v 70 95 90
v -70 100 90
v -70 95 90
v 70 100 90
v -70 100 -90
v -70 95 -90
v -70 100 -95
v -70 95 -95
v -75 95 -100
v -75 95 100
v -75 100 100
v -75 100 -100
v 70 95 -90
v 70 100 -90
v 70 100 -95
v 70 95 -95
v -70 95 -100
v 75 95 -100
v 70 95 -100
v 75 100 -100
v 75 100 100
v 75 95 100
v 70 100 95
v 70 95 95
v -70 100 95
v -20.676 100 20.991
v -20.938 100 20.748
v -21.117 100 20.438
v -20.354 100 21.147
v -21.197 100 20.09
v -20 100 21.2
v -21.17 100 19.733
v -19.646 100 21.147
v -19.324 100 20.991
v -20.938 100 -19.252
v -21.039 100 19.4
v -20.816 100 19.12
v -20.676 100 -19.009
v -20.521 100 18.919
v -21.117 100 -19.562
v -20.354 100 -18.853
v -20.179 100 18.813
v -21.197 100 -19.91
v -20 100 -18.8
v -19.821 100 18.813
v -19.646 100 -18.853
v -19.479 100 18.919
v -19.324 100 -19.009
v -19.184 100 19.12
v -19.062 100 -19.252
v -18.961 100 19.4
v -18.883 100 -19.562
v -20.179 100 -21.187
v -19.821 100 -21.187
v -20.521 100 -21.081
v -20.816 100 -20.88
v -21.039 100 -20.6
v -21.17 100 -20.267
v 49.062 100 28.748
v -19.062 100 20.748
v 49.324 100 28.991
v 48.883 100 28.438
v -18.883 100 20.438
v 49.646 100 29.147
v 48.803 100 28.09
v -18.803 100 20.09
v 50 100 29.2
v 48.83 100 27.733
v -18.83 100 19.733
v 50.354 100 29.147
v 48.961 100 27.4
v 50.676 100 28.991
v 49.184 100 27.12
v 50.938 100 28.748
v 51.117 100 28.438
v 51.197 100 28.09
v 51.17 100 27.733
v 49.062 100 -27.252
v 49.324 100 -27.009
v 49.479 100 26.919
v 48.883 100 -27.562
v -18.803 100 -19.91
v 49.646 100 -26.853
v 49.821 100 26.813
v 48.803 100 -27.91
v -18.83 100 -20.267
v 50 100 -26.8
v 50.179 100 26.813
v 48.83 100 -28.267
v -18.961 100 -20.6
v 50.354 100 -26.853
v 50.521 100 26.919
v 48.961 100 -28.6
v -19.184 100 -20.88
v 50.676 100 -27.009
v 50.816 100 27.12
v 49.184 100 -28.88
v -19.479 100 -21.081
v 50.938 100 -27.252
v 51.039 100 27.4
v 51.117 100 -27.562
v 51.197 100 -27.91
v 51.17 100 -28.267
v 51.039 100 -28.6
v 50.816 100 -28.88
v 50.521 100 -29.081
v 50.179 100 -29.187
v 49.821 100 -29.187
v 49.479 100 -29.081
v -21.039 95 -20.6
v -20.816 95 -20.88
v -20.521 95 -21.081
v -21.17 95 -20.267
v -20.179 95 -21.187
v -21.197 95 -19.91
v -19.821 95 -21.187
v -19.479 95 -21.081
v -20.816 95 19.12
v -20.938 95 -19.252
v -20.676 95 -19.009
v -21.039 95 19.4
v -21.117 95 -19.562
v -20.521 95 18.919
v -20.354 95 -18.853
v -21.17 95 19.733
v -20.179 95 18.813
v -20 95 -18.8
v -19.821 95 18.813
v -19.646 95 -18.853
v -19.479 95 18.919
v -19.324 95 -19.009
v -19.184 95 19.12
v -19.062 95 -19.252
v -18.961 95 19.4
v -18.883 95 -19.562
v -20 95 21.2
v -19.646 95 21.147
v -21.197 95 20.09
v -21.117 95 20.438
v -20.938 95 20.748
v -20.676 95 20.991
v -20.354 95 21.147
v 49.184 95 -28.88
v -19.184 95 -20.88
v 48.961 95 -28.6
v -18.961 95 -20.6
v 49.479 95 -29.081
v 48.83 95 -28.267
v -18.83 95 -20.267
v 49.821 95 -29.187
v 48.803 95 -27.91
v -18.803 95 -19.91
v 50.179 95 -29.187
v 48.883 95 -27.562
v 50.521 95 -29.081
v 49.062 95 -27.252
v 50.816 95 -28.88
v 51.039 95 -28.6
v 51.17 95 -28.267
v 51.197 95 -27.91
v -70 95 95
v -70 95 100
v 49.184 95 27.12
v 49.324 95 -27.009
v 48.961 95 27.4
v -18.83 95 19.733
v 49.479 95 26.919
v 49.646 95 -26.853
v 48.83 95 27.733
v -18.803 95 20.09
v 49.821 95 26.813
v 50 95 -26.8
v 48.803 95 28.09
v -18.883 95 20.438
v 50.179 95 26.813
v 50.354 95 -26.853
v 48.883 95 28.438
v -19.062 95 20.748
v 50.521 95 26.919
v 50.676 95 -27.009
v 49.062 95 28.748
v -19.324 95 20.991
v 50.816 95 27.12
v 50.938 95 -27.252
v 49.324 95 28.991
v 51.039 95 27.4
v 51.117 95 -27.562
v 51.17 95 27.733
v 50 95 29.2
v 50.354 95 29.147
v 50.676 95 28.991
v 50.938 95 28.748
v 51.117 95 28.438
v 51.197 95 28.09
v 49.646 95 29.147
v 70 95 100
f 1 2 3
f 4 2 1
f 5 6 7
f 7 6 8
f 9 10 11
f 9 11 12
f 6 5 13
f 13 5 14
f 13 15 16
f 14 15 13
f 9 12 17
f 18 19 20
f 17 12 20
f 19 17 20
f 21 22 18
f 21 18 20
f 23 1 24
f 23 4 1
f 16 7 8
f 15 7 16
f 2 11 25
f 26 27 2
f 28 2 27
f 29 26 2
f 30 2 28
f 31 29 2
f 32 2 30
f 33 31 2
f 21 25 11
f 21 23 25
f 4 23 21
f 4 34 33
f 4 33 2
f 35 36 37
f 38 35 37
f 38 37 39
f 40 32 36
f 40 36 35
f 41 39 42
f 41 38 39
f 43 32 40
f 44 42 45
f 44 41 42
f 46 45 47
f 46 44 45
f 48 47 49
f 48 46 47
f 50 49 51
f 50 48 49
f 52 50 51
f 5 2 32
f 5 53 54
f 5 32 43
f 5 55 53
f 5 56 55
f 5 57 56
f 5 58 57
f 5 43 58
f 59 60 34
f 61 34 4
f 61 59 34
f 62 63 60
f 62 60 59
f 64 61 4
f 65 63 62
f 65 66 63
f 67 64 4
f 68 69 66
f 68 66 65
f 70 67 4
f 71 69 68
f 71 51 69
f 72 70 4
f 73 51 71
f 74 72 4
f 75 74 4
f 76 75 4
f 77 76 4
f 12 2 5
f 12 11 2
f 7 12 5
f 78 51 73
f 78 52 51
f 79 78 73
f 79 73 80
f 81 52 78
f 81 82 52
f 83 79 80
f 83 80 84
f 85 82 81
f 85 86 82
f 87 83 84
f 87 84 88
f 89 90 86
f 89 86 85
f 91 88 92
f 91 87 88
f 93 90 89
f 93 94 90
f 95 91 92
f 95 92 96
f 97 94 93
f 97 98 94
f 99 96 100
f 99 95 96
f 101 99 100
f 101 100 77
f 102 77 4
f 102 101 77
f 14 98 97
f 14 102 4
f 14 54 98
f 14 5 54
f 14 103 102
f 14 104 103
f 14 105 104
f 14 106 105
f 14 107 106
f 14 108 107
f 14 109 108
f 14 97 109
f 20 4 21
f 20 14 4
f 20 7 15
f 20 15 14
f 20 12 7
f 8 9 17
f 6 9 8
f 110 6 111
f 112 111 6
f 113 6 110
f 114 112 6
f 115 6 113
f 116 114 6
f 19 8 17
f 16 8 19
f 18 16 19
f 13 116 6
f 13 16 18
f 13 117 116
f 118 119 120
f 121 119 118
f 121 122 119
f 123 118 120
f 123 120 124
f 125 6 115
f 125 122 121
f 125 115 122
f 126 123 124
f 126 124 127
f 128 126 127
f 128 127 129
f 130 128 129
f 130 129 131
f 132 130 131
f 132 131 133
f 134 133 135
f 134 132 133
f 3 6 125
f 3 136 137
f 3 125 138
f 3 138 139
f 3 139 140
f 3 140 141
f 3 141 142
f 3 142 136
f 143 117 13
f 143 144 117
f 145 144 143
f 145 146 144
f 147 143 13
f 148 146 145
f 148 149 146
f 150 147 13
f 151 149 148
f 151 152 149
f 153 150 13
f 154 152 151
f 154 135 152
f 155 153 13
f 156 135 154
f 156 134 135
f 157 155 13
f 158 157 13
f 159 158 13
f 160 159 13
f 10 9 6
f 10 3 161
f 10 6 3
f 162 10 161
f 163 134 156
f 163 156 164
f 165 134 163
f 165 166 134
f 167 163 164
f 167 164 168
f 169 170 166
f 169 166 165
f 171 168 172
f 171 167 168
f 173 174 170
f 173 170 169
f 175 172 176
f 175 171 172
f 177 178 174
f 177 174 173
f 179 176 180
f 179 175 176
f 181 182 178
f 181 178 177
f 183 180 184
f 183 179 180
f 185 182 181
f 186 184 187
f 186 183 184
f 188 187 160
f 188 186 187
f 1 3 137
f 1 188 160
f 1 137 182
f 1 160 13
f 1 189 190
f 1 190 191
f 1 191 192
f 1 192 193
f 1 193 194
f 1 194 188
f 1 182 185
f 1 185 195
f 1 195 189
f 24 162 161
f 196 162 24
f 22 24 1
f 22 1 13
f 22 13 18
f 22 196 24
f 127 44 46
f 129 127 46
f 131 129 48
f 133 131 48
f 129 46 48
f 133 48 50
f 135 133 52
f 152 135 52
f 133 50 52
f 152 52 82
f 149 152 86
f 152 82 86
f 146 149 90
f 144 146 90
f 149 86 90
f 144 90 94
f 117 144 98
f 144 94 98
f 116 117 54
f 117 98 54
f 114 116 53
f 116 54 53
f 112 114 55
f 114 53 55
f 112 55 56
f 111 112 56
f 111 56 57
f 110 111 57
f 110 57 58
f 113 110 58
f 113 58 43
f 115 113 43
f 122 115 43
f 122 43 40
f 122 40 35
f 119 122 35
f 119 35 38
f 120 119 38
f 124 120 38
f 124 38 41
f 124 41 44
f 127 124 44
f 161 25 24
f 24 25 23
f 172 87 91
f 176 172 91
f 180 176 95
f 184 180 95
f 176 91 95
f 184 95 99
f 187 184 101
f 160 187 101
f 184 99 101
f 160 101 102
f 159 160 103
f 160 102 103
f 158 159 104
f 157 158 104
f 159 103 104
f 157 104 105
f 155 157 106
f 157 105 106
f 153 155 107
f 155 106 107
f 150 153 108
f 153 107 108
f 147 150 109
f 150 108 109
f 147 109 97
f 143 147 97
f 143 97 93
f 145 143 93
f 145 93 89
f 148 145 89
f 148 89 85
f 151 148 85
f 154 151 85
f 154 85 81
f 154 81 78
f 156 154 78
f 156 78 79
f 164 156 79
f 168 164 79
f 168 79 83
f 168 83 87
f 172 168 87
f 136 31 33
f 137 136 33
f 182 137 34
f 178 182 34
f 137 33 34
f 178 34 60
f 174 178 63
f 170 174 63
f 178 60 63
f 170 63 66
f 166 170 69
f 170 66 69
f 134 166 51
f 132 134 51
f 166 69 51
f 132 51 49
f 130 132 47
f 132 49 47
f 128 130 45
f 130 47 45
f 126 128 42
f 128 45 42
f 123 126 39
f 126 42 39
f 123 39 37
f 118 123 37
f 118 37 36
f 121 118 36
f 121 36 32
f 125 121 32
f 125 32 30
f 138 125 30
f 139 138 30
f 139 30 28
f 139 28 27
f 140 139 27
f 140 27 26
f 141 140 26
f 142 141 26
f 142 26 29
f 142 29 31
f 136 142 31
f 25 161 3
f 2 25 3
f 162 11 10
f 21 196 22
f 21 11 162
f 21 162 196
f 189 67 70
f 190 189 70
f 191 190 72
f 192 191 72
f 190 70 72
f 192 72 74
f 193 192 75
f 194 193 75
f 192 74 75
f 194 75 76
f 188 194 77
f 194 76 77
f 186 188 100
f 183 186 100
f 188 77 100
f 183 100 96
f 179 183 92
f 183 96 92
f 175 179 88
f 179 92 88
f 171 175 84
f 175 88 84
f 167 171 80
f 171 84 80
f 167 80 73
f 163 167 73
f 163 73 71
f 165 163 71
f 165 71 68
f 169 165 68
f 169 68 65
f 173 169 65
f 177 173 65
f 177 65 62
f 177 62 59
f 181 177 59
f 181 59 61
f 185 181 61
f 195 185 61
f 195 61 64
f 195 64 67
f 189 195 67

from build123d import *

# Parameters (mm, degrees)
SKETCH1_W           = 150
SKETCH1_H           = 200
BOSS_EXTRUDE1_DEPTH = 100
SHELL2_T            = -5
SKETCH5_R           = 1.9
CUT_EXTRUDE2_DEPTH  = 10
BOSS_EXTRUDE4_DEPTH = 200
SKETCH9_W           = 101.133931545
SKETCH9_H           = 31.996148617
CUT_EXTRUDE4_DEPTH  = 236.849528301
SKETCH10_R          = 4
CUT_EXTRUDE5_DEPTH  = 10
CUT_EXTRUDE7_REACH  = 162.078
SKETCH11_W          = 140
SKETCH11_H          = 5
SKETCH15_R          = 1.2
CUT_EXTRUDE11_DEPTH = 10
SKETCH36_W          = 60
SKETCH36_H          = 5
BOSS_EXTRUDE7_DEPTH = 10
SKETCH37_R          = 3.5
CUT_EXTRUDE15_DEPTH = 60
SKETCH38_R          = 5
CUT_EXTRUDE16_DEPTH = 70
SKETCH39_W          = 156.49295795
SKETCH39_H          = 102.702702005
CUT_EXTRUDE17_DEPTH = 236.849528301


with BuildPart() as part:
    # Sketch1 → Boss-Extrude1 (new body)
    with BuildSketch(Plane(origin=(0, 0, 0), x_dir=(1, 0, 0), z_dir=(0, 1, 0))):
        Rectangle(SKETCH1_W, SKETCH1_H)
    extrude(amount=BOSS_EXTRUDE1_DEPTH)

    # Shell2
    shell2_openings = [part.faces().sort_by_distance(p)[0] for p in [
        (0, 50, -100),
        (0, 50, 100),
    ]]
    offset(amount=SHELL2_T, openings=shell2_openings, kind=Kind.INTERSECTION)

    # Sketch5 → Cut-Extrude2 (cut)
    with BuildSketch(Plane.XZ):
        with Locations(Location((-65, 91, 0), (0, 0, 270))):
            Circle(SKETCH5_R)
        with Locations(Location((-35, 91, 0), (0, 0, 270))):
            Circle(SKETCH5_R)
        with Locations(Location((-65, 67, 0), (0, 0, 270))):
            Circle(SKETCH5_R)
        with Locations(Location((-35, 67, 0), (0, 0, 270))):
            Circle(SKETCH5_R)
    cut_extrude2 = extrude(amount=-CUT_EXTRUDE2_DEPTH, mode=Mode.SUBTRACT)

    # Mirror2: Cut-Extrude2 across plane
    add(cut_extrude2.mirror(Plane.XY), mode=Mode.SUBTRACT)

    # Sketch8 → Boss-Extrude4 (add, through all)
    with BuildSketch(Plane.XY.offset(100)):
        Polygon((-15, 17), (75, 17), (75, 22), (-20, 22), (-20, 0), (-15, 0), align=None)
    extrude(amount=-BOSS_EXTRUDE4_DEPTH)

    # Sketch9 → Cut-Extrude4 (cut, through all)
    with BuildSketch(Plane.XY.offset(100)):
        with Locations((35.566965773, 1.001925691)):
            Rectangle(SKETCH9_W, SKETCH9_H)
    extrude(amount=-CUT_EXTRUDE4_DEPTH, mode=Mode.SUBTRACT)

    # Sketch10 → Cut-Extrude5 (cut)
    with BuildSketch(Plane.XZ.offset(-17)):
        with Locations((60, 0)):
            Circle(SKETCH10_R)
    extrude(amount=-CUT_EXTRUDE5_DEPTH, mode=Mode.SUBTRACT)

    # Cut-Extrude7: up to this face of the body (flat: up to its plane)
    cut_extrude7_end = Plane(part.part.faces().sort_by_distance((-44.954220044, 5, 0))[0])
    # Sketch11 → Cut-Extrude7 (cut, up to the picked face)
    with BuildSketch(Plane(origin=(0, 100, 0), x_dir=(1, 0, 0), z_dir=(0, 1, 0)), mode=Mode.PRIVATE) as cut_extrude7_sk1:
        with Locations((0, -92.5)):
            Rectangle(SKETCH11_W, SKETCH11_H)
    cut_extrude7_tool1 = split(extrude(cut_extrude7_sk1.sketch, amount=-CUT_EXTRUDE7_REACH, mode=Mode.PRIVATE), bisect_by=cut_extrude7_end, keep=Keep.BOTH, mode=Mode.PRIVATE)
    cut_extrude7 = cut_extrude7_tool1.solids().sort_by(Axis((0, 100, 92.5), (0, -1, 0)))[0]
    add(cut_extrude7, mode=Mode.SUBTRACT)

    # Mirror3: Cut-Extrude7 across plane
    add(cut_extrude7.mirror(Plane.XY), mode=Mode.SUBTRACT)

    # Sketch15 → Cut-Extrude11 (cut)
    with BuildSketch(Plane(origin=(0, 100, 0), x_dir=(1, 0, 0), z_dir=(0, 1, 0))):
        with Locations(Location((50, 28, 0), (0, 0, 270))):
            Circle(SKETCH15_R)
        with Locations(Location((50, -28, 0), (0, 0, 270))):
            Circle(SKETCH15_R)
        with Locations(Location((-20, 20, 0), (0, 0, 270))):
            Circle(SKETCH15_R)
        with Locations(Location((-20, -20, 0), (0, 0, 270))):
            Circle(SKETCH15_R)
    extrude(amount=-CUT_EXTRUDE11_DEPTH, mode=Mode.SUBTRACT)

    # Sketch36 → Boss-Extrude7 (add)
    with BuildSketch(Plane.ZY.offset(-70)):
        with Locations((-13.202053215, 62.5)):
            Rectangle(SKETCH36_W, SKETCH36_H)
    boss_extrude7 = extrude(amount=BOSS_EXTRUDE7_DEPTH)

    # Mirror5: Boss-Extrude7 across plane
    add(boss_extrude7.mirror(Plane(origin=(0, 0, 0), x_dir=(0, 0, 1), z_dir=(1, 0, 0))))

    # Sketch37 → Cut-Extrude15 (cut)
    with BuildSketch(Plane(origin=(75, 0, 0), x_dir=(0, 0, -1), z_dir=(1, 0, 0))):
        with Locations((0, 75)):
            Circle(SKETCH37_R)
    extrude(amount=-CUT_EXTRUDE15_DEPTH, mode=Mode.SUBTRACT)

    # Sketch38 → Cut-Extrude16 (cut)
    with BuildSketch(Plane.ZY.offset(75)):
        with Locations((0, 80)):
            Circle(SKETCH38_R)
    extrude(amount=-CUT_EXTRUDE16_DEPTH, mode=Mode.SUBTRACT)

    # Sketch39 → Cut-Extrude17 (cut, through all)
    with BuildSketch(Plane.XY.offset(100)):
        with Locations((3.246478975, 43.648648997)):
            Rectangle(SKETCH39_W, SKETCH39_H)
    extrude(amount=-CUT_EXTRUDE17_DEPTH, mode=Mode.SUBTRACT)


solid = part.part
